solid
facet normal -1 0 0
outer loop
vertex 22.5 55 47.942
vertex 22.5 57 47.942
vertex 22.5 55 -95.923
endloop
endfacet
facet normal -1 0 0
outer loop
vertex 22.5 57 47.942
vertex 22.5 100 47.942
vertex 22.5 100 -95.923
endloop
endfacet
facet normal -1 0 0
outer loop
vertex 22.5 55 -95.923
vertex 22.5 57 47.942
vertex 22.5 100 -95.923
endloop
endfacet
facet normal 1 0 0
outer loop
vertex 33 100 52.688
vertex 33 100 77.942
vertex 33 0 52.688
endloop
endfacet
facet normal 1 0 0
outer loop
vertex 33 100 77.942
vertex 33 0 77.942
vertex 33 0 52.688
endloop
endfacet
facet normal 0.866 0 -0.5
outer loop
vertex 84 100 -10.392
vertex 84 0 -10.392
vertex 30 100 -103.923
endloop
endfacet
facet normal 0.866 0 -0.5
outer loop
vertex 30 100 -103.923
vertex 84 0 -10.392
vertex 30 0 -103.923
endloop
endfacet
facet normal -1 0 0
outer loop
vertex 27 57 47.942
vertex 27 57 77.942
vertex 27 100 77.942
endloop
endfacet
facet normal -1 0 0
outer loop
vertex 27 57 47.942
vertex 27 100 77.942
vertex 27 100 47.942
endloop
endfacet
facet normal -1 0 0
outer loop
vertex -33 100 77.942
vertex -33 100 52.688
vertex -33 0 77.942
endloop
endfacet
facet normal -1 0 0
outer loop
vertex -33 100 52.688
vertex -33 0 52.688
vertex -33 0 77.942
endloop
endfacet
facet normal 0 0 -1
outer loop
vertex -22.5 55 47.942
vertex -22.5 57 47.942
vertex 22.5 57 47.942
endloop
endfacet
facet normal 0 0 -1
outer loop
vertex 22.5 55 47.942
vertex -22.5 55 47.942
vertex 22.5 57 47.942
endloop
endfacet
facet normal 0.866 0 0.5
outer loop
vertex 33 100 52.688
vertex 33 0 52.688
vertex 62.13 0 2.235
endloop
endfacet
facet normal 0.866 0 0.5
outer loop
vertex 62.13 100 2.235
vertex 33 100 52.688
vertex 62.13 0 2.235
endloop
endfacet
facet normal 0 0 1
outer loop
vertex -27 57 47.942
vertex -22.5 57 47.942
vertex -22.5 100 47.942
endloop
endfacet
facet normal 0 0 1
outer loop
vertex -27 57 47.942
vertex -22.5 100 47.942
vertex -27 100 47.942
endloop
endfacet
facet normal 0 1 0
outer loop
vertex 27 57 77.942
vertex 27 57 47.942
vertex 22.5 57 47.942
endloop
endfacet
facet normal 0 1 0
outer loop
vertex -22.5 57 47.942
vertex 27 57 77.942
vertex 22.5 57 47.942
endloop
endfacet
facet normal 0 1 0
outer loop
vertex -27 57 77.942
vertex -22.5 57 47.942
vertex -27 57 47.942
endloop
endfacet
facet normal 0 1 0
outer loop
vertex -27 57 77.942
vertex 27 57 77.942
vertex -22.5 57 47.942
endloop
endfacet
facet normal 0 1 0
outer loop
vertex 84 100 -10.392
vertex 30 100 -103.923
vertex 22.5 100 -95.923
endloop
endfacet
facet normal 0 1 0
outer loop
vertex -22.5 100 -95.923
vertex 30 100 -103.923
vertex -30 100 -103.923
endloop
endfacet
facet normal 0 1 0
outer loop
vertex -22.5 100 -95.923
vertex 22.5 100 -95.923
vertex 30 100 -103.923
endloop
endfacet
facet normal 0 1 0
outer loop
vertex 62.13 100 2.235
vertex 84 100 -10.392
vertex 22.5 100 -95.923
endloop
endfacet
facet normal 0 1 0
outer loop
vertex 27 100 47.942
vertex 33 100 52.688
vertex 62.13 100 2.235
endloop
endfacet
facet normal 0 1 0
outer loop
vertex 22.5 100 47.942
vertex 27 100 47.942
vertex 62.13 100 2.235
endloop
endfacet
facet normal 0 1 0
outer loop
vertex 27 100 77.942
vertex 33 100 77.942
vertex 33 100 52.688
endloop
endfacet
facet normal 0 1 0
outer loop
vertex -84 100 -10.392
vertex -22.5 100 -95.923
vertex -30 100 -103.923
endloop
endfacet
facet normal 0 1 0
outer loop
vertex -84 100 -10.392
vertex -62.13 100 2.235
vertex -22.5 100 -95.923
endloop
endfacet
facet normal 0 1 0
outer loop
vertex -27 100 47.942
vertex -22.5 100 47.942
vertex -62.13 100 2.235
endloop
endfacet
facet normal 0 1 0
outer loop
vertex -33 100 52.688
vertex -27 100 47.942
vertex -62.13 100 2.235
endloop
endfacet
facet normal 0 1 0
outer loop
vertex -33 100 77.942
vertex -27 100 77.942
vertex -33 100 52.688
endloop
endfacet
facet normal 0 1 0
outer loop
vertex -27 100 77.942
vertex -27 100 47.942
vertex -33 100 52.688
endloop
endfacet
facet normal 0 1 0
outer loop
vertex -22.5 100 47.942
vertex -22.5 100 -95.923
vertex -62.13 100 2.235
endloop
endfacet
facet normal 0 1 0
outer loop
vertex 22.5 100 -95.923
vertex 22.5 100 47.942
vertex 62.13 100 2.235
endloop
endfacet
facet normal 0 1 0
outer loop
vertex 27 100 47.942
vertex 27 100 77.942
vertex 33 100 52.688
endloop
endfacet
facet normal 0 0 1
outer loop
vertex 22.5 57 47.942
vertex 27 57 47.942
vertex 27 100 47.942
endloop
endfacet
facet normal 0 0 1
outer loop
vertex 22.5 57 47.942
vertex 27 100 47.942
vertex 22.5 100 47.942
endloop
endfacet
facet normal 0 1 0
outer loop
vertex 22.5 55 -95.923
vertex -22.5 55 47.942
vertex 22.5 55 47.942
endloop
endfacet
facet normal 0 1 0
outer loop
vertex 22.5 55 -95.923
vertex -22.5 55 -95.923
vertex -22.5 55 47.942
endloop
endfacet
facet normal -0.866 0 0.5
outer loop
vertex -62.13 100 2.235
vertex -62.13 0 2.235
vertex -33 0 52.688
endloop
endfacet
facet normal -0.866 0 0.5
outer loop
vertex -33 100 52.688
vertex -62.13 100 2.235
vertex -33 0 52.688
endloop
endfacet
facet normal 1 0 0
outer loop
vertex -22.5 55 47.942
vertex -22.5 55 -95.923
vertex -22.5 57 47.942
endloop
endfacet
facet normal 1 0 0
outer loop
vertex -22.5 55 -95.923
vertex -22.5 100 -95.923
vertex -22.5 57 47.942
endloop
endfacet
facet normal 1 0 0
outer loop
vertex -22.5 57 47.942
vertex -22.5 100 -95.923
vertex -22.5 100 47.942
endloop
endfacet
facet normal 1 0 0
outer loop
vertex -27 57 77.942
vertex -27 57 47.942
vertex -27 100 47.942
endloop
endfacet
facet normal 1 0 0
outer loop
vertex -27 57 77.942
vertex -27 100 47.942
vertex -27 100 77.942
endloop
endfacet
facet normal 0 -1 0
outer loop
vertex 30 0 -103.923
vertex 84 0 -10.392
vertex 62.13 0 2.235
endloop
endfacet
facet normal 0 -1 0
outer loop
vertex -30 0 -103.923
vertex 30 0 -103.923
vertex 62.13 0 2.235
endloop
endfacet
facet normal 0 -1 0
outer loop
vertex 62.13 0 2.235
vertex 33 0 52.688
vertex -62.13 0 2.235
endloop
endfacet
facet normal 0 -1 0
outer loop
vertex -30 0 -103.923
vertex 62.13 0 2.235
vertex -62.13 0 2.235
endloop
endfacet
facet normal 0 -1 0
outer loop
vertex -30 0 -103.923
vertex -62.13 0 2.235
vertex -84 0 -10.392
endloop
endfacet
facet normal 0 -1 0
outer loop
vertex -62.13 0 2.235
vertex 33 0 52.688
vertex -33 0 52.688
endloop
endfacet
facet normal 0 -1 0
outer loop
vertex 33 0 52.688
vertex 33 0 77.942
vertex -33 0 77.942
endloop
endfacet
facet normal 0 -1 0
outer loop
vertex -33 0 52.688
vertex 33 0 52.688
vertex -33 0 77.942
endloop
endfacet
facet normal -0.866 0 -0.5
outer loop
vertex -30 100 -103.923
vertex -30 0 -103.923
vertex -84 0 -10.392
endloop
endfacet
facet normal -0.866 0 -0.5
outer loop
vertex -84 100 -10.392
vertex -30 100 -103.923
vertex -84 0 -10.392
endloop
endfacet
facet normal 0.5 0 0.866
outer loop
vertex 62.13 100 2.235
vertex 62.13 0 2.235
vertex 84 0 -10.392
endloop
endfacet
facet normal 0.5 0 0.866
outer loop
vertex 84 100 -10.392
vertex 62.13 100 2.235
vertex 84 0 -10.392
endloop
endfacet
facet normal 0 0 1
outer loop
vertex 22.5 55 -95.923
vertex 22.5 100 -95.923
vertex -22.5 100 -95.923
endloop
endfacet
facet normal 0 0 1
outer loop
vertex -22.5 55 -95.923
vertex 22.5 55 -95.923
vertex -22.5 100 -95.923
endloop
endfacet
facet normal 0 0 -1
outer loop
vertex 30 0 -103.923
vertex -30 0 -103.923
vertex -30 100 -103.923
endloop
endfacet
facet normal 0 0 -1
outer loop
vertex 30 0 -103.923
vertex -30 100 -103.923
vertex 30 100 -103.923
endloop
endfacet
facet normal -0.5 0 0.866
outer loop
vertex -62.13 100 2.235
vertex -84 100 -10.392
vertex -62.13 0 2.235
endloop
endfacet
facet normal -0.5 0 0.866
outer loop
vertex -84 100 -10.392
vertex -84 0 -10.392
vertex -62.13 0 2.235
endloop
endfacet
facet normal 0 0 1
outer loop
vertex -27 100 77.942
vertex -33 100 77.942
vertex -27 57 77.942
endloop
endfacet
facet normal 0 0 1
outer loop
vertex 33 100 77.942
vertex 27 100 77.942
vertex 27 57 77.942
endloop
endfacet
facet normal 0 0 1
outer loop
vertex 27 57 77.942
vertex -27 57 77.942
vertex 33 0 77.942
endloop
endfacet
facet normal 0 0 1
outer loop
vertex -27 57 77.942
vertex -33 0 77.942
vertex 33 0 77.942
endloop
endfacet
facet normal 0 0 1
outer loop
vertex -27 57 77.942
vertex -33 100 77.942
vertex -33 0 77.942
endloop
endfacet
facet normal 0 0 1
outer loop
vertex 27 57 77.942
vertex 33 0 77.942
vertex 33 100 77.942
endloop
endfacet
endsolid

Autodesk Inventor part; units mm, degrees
ref_plane "YZ Plane" through (0, 0, 0) normal (1, 0, 0) x (0, 1, 0)
ref_plane "XZ Plane" through (0, 0, 0) normal (0, 1, 0) x (-1, 0, 0)
ref_plane "XY Plane" through (0, 0, 0) normal (0, 0, 1) x (1, 0, 0)
sketch "スケッチ1" plane through (0, 0, 0) normal (0, 1, 0) x (-1, 0, 0)
  line L0 (135, 77.9423) -> (-135, 77.9423)
  line L1 (-135, 77.9423) -> (0, -155.8846)
  line L2 (0, -155.8846) -> (135, 77.9423)
  line L3 (135, 77.9423) -> (-67.5, -38.9711)
  line L4 (75, 77.9423) -> (105, 25.9808)
  line L5 (30, -103.923) -> (-30, -103.923)
  line L6 (-105, 25.9808) -> (-75, 77.9423)
  line L7 (0, 77.9423) -> (0, -155.8846)
  line L8 (-135, 77.9423) -> (67.5, -38.9711)
  line L9 (-33, 77.9423) -> (-33, 52.6884)
  line L10 (-33, 52.6884) -> (-62.1295, 2.2346)
  line L11 (-62.1295, 2.2346) -> (-84, -10.3923)
  line L12 (27, 77.9423) -> (-27, 77.9423)
  line L13 (-27, 77.9423) -> (-27, 47.9423)
  line L14 (-27, 47.9423) -> (27, 47.9423)
  line L15 (27, 47.9423) -> (27, 77.9423)
  point P0 (0, 0)
  point P1 (0, 77.9423)
  point P2 (0, 47.9423)
  dimension "d0" = 270
  dimension "d2" = 30
  dimension "d5" = 42
  dimension "d6" = 49
  dimension "d9" = 54
  dimension "d14" = 30
extrude "押し出し1" add sketch "スケッチ1" along normal blind 100 contours L4 L3 L7 L14 L15 L0 | L2 L8 L3 L4 | L15 L14 L7 L0 | L2 L5 L7 L8 | L7 L5 L1 L3 | L8 L10 L9 L0 L13 L14 L7 | L3 L1 L11 L10 L8 | L7 L14 L13 L0 | L10 L11 L1 L6 L8 | L8 L6 L0 L9 L10
extrude "押し出し2" cut sketch "スケッチ1" along normal blind 100 contours L10 L11 L1 L6 L8 | L8 L6 L0 L9 L10
mirror "ミラー1" about plane through (0, 0, 0) normal (1, 0, 0) of "押し出し2"
extrude "押し出し3" cut sketch "スケッチ1" along normal blind 100 contours L15 L14 L7 L0 | L7 L14 L13 L0
extrude "押し出し4" add sketch "スケッチ1" along normal blind 57 contours L15 L14 L7 L0 | L7 L14 L13 L0
sketch "スケッチ2" plane through (0, 100, 0) normal (0, 1, 0) x (1, 0, 0)
  line L0 (-27, -47.9423) -> (27, -47.9423) projected
  line L1 (-22.5, -47.9423) -> (22.5, -47.9423)
  line L2 (22.5, -47.9423) -> (22.5, 95.923)
  line L3 (22.5, 95.923) -> (-22.5, 95.923)
  line L4 (-22.5, 95.923) -> (-22.5, -47.9423)
  line L5 (30, 103.923) -> (-30, 103.923) projected
  point P0 (0, 0)
  point P1 (0, -47.9423)
  dimension "d15" = 45
  dimension "d16" = 8
extrude "押し出し5" cut sketch "スケッチ2" against normal blind 45
properties part number "cover"
